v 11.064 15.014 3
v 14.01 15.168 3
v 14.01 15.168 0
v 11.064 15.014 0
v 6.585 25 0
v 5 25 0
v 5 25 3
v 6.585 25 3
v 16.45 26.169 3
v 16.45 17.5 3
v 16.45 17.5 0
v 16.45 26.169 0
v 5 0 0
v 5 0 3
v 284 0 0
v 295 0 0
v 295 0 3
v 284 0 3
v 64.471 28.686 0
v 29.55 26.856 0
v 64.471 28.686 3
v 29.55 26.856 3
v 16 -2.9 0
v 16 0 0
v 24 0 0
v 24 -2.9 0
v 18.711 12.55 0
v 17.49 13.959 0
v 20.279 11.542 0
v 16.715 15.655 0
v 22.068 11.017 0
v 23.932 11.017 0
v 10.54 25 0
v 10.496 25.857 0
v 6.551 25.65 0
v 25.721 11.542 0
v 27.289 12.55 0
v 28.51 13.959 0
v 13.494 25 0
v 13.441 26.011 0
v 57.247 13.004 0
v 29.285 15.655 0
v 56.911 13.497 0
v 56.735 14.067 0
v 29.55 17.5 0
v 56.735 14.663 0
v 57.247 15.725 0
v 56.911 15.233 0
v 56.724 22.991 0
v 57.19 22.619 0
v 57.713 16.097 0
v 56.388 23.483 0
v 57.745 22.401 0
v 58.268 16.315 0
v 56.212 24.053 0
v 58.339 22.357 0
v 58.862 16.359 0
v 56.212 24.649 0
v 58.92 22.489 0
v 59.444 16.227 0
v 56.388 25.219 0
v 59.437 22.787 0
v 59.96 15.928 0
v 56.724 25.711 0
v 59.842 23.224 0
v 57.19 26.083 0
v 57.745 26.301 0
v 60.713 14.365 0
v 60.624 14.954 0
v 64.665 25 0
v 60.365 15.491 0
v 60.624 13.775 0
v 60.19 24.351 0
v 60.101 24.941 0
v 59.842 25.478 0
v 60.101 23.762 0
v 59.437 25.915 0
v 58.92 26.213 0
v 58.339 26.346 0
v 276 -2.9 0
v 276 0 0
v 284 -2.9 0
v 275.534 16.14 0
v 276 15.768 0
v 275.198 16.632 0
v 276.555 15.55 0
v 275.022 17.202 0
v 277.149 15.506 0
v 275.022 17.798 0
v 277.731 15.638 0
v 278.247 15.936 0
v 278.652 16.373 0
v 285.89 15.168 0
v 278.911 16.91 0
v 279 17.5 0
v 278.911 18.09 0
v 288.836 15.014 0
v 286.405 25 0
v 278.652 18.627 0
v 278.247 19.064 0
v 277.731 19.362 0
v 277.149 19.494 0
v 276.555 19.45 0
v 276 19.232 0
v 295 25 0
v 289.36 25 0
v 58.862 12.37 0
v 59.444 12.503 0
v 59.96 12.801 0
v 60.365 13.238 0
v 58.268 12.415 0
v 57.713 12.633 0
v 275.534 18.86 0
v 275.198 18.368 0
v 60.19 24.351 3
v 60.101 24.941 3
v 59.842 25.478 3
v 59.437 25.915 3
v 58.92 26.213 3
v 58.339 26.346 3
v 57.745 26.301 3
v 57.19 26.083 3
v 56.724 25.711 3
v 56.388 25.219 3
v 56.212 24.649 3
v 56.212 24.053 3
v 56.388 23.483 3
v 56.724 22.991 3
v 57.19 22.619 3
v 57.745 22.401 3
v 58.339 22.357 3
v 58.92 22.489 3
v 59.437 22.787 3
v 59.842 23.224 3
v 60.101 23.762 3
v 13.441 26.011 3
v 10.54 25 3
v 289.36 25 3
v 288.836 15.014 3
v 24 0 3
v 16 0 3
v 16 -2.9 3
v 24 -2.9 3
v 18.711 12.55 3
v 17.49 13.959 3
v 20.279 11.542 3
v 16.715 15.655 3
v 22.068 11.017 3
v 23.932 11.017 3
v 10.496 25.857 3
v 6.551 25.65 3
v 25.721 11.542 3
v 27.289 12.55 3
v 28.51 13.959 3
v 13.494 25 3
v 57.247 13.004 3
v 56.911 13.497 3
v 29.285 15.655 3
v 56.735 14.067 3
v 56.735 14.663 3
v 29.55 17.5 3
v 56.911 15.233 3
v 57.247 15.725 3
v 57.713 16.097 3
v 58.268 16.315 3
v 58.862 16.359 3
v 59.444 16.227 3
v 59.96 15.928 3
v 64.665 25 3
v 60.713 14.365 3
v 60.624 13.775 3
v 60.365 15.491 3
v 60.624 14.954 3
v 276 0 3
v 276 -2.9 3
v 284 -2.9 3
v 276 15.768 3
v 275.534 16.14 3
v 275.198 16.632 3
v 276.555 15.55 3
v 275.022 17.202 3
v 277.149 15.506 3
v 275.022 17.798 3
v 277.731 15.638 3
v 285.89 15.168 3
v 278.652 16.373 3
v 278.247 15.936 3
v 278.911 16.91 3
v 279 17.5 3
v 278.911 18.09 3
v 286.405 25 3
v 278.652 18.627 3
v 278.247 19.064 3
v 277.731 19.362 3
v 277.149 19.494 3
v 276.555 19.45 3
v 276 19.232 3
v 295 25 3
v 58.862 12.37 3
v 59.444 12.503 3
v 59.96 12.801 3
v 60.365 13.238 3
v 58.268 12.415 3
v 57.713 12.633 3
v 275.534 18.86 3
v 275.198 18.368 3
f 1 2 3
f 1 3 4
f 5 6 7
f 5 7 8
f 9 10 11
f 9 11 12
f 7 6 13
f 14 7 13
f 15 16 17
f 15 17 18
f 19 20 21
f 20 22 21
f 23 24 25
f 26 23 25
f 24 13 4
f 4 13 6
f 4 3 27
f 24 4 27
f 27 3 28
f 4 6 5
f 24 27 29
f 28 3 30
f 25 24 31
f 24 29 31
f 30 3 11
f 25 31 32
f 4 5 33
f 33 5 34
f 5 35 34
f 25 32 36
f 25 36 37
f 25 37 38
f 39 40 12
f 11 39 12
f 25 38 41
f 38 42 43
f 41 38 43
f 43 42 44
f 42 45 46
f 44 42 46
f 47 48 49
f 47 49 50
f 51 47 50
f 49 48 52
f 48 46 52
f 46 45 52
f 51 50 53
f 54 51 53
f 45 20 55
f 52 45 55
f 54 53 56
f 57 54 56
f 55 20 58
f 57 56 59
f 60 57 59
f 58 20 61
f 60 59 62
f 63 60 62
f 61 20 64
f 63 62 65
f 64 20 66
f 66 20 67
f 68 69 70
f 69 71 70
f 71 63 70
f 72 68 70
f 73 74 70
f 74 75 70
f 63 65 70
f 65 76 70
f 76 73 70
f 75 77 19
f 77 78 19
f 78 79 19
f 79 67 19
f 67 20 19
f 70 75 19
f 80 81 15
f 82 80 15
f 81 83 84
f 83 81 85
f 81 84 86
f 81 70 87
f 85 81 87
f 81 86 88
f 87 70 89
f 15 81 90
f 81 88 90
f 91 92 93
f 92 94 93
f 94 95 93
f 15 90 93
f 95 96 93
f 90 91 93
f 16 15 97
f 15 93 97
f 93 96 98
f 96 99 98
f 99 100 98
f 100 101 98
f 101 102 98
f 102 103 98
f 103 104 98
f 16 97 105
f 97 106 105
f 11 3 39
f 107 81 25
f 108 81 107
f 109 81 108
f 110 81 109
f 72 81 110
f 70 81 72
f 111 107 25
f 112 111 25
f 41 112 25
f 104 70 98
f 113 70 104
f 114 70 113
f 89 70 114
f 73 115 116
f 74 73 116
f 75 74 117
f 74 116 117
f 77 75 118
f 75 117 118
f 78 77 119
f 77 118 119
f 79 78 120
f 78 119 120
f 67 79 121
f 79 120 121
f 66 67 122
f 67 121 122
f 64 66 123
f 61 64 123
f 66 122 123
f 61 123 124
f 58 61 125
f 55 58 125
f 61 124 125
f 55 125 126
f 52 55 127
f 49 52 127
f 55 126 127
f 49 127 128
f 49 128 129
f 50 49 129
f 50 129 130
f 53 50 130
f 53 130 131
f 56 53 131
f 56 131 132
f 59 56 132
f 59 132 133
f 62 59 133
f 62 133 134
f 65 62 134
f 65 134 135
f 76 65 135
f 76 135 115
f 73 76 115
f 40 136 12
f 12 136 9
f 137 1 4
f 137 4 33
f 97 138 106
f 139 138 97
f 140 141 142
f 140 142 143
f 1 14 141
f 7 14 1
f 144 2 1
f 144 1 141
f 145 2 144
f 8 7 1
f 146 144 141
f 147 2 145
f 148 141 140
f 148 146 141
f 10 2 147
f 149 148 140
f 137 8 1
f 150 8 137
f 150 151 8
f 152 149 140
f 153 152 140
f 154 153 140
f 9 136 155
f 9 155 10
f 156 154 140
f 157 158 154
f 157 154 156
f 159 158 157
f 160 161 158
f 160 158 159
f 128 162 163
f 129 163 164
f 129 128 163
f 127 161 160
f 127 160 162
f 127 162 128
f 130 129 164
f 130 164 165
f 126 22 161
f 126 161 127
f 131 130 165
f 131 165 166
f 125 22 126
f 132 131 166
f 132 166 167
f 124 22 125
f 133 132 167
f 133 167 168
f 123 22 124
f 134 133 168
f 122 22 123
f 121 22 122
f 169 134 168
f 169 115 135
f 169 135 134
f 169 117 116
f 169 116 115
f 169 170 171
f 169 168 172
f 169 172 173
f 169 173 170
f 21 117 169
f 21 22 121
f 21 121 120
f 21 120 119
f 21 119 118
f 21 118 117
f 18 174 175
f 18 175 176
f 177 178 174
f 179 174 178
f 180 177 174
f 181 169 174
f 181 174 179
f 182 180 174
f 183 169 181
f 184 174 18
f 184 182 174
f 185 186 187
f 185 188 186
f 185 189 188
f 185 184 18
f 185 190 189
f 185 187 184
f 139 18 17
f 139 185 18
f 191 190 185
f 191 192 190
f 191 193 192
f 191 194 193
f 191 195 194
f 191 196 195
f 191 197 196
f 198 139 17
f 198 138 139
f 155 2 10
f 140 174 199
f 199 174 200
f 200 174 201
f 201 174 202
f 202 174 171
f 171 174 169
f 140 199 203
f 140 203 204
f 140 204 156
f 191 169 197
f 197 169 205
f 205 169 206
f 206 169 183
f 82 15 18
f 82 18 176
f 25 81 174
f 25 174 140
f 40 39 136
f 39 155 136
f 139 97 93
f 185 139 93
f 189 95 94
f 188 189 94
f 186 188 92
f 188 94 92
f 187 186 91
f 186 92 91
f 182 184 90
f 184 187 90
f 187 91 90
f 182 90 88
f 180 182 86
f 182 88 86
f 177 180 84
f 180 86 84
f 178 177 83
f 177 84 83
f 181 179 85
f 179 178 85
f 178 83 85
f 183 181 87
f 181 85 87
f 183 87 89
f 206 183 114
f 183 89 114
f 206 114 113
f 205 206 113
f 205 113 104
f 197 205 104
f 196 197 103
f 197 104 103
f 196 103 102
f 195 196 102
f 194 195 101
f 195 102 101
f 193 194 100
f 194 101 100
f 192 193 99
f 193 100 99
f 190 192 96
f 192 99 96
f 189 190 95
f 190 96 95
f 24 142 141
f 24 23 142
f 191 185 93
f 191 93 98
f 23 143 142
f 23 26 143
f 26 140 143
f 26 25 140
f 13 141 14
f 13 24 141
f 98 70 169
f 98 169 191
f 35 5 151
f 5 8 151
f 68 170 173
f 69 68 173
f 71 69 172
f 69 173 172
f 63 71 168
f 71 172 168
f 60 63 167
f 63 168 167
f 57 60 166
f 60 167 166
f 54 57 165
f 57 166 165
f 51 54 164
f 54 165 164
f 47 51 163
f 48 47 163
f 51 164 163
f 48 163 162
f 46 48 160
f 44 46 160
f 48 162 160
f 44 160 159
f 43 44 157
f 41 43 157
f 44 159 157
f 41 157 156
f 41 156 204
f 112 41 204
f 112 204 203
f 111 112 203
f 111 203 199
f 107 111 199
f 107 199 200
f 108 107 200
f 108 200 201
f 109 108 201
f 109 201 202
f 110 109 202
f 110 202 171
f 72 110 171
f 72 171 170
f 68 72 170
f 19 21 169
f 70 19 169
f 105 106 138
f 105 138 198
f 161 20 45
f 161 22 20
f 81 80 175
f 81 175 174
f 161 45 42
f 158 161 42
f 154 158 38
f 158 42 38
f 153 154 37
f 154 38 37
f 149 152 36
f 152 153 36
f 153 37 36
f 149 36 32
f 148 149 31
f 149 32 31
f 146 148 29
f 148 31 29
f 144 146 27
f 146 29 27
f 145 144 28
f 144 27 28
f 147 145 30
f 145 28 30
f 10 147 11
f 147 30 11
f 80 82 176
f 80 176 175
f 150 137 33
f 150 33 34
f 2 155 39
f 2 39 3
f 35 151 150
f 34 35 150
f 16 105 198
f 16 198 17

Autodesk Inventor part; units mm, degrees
ref_plane "YZ Plane" through (0, 0, 0) normal (1, 0, 0) x (0, 1, 0)
ref_plane "XZ Plane" through (0, 0, 0) normal (0, 1, 0) x (-1, 0, 0)
sketch "草圖1" plane through (0, 0, 0) normal (0, 0, 1) x (1, 0, 0)
  line L0 (0, 25) -> (300, 25)
  line L1 (300, 25) -> (300, 0)
  line L2 (300, 0) -> (0, 0)
  line L3 (0, 0) -> (0, 25)
  circle A0 centre (23, 17.5) radius 6.55
  circle A1 centre (277, 17.5) radius 2
  line L4 (16, 0) -> (24, 0)
  line L5 (24, 0) -> (24, -2.9)
  line L6 (24, -2.9) -> (16, -2.9)
  line L7 (16, -2.9) -> (16, 0)
  line L8 (276, 0) -> (284, 0)
  line L9 (284, 0) -> (284, -2.9)
  line L10 (284, -2.9) -> (276, -2.9)
  line L11 (276, -2.9) -> (276, 0)
  line L12 (0, 25) -> (5, 25)
  line L13 (5, 25) -> (5, 0)
  line L14 (5, 0) -> (0, 0)
  line L15 (0, 0) -> (0, 25)
  line L16 (300, 25) -> (295, 25)
  line L17 (295, 25) -> (295, 0)
  line L18 (295, 0) -> (300, 0)
  line L19 (300, 0) -> (300, 25)
  line L20 (24, -1.45) -> (276, -1.45) construction
  point P0 (16, -1.45)
  point P1 (284, -1.45)
  point P2 (284, 0)
  point P3 (24, 0)
  point P4 (150, -1.45)
  point P5 (150, 0)
  dimension "d0" = 300
  dimension "d1" = 25
  dimension "d2" = 7.5
  dimension "d3" = 13.1
  dimension "d4" = 23
  dimension "d5" = 23
  dimension "d6" = 7.5
  dimension "d7" = 4
  dimension "d12" = 8
  dimension "d13" = 2.9
  dimension "d14" = 8
  dimension "d30" = 5
  dimension "d31" = 5
  dimension "d32" = 252
extrude "擠出1" add sketch "草圖1" along normal blind 3 contours L0 L17 L2 L13 | L2 L5 L6 L7 | L9 L10 L11 L2
sketch "草圖2" plane through (0, 0, 3) normal (0, 0, 1) x (1, 0, 0)
  line L0 (10.5404, 25) -> (13.4864, 25.1544)
  line L1 (13.4864, 25.1544) -> (14.0097, 15.1681)
  line L2 (14.0097, 15.1681) -> (11.0638, 15.0137)
  line L3 (11.0638, 15.0137) -> (10.5404, 25)
  line L4 (295, 25) -> (5, 25) projected
  line L5 (16.048, 25) -> (29.13, 25.6856)
  line L6 (29.13, 25.6856) -> (30.1465, 6.2887)
  line L7 (30.1465, 6.2887) -> (17.0645, 5.6031)
  line L8 (17.0645, 5.6031) -> (16.048, 25)
  circle A0 centre (23, 17.5) radius 6.55 projected
  line L9 (14.0097, 15.1681) -> (16.5562, 15.3016)
  line L10 (286.4135, 25.1544) -> (289.3595, 25)
  line L11 (289.3595, 25) -> (288.8361, 15.0137)
  line L12 (288.8361, 15.0137) -> (285.8901, 15.1681)
  line L13 (285.8901, 15.1681) -> (286.4135, 25.1544)
  line L14 (275.2453, 22.2337) -> (279.2399, 22.0243)
  line L15 (279.2399, 22.0243) -> (278.6818, 11.3762)
  line L16 (278.6818, 11.3762) -> (274.6873, 11.5855)
  line L17 (274.6873, 11.5855) -> (275.2453, 22.2337)
  circle A1 centre (277, 17.5) radius 2 projected
  line L18 (285.8901, 15.1681) -> (278.8997, 15.5344)
  point P0 (0, 0)
  point P1 (300, 25)
  point P2 (0, 25)
  point P3 (286.4054, 25)
  point P4 (13.4945, 25)
  dimension "d16" = 2.95
  dimension "d18" = 10
  dimension "d19" = 87
  dimension "d20" = 87
  dimension "d22" = 87
  dimension "d23" = 87
  dimension "d24" = 2.95
  dimension "d25" = 10
  dimension "d33" = 9.1
  dimension "d34" = 9
extrude "擠出2" cut sketch "草圖2" against normal up to surface (3 mm away) contours L4 L11 L12 L13 | L4 L1 L2 L3
sketch "草圖7" plane through (0, 0, 3) normal (0, 0, 1) x (1, 0, 0)
  line L0 (64.4714, 28.6858) -> (65.4135, 10.7104)
  line L1 (65.4135, 10.7104) -> (7.493, 7.675)
  line L2 (7.493, 7.675) -> (6.5509, 25.6503)
  line L3 (6.5509, 25.6503) -> (64.4714, 28.6858)
  line L4 (13.4945, 25) -> (14.0097, 15.1681) projected
  circle A0 centre (23, 17.5) radius 6.55 projected
  line L5 (285.8901, 15.1681) -> (286.4054, 25) projected
  line L6 (286.4054, 25) -> (13.4945, 25) projected
  line L7 (13.4945, 25) -> (14.0097, 15.1681) projected
  line L8 (14.0097, 15.1681) -> (11.0638, 15.0137) projected
  line L9 (11.0638, 15.0137) -> (10.5404, 25) projected
  line L10 (10.5404, 25) -> (5, 25) projected
  line L11 (5, 25) -> (5, 0) projected
  line L12 (5, 0) -> (16, 0) projected
  line L13 (16, 0) -> (16, -2.9) projected
  line L14 (16, -2.9) -> (24, -2.9) projected
  line L15 (24, -2.9) -> (24, 0) projected
  line L16 (24, 0) -> (276, 0) projected
  line L17 (276, 0) -> (276, -2.9) projected
  line L18 (276, -2.9) -> (284, -2.9) projected
  line L19 (284, -2.9) -> (284, 0) projected
  line L20 (284, 0) -> (295, 0) projected
  line L21 (295, 0) -> (295, 25) projected
  line L22 (295, 25) -> (289.3595, 25) projected
  line L23 (289.3595, 25) -> (288.8361, 15.0137) projected
  line L24 (288.8361, 15.0137) -> (285.8901, 15.1681) projected
  circle A1 centre (23, 17.5) radius 6.55 projected
  circle A2 centre (277, 17.5) radius 2 projected
  line L25 (13.4945, 25) -> (13.4414, 26.0114)
  line L26 (10.5404, 25) -> (11.0638, 15.0137) projected
  line L27 (10.5404, 25) -> (10.4955, 25.857)
  point P0 (0, 0)
  point P1 (64.6646, 25)
  point P2 (6.585, 25)
  dimension "d50" = 42
  dimension "d51" = 16
  dimension "d52" = 18
  dimension "d53" = 9
extrude "擠出5" add sketch "草圖7" against normal up to surface (3 mm away) contours L0 L6 L25 L3 | L27 L10 L2 L3
sketch "草圖9" plane through (0, 0, 3) normal (0, 0, 1) x (1, 0, 0)
  line L0 (10.4955, 25.857) -> (6.5509, 25.6503) projected
  line L1 (6.5509, 25.6503) -> (64.4714, 28.6858)
  line L2 (64.4714, 28.6858) -> (65.4135, 10.7104)
  line L3 (65.4135, 10.7104) -> (7.493, 7.675)
  line L4 (7.493, 7.675) -> (6.5509, 25.6503)
  circle A0 centre (58.1897, 24.3511) radius 2
  circle A1 centre (58.713, 14.3648) radius 2
  line L5 (58.1897, 24.3511) -> (58.713, 14.3648)
  line L6 (58.4513, 19.3579) -> (64.9424, 19.6981)
  circle A2 centre (23, 17.5) radius 6.55 projected
  point P0 (0, 0)
  dimension "d60" = 18
  dimension "d64" = 4
  dimension "d66" = 6.5
  dimension "d67" = 10
extrude "擠出6" cut sketch "草圖9" against normal up to surface (3 mm away) contours A1 | A0
sketch "草圖11" plane through (0, 0, 3) normal (0, 0, 1) x (1, 0, 0)
  line L0 (16.45, 26.8556) -> (29.55, 26.8556)
  line L1 (29.55, 26.8556) -> (29.55, 17.5)
  line L2 (29.55, 17.5) -> (16.45, 17.5)
  line L3 (16.45, 17.5) -> (16.45, 26.8556)
  circle A0 centre (23, 17.5) radius 6.55 projected
  line L4 (64.4714, 28.6858) -> (13.4414, 26.0114) projected
  point P0 (0, 0)
  dimension "d74" = 13.1
extrude "擠出7" cut sketch "草圖11" against normal blind 10 contours L0 L4 L3 | L1 A0 L3 L4 | L2 A0 picked at (21.0033, 19.0372)
ref_plane "工作平面2" through (150, 0, 0) normal (-1, 0, 0) x (0, 0, 1)
mirror "鏡射2" [suppressed]
sketch "草圖12" plane through (0, 0, 3) normal (0, 0, 1) x (1, 0, 0)
  arc A0 (279, 17.5) -> (279, 17.5) centre (277, 17.5) ccw projected
  line L0 (279, 17.5) -> (283.55, 17.5)
  circle A1 centre (277, 17.5) radius 6.55
  point P0 (0, 0)
extrude "擠出8" [suppressed]
sketch "草圖10" plane through (0, 0, 3) normal (0, 0, 1) x (1, 0, 0)
  line L0 (285.8901, 15.1681) -> (286.4054, 25) projected
  line L1 (286.4054, 25) -> (64.6646, 25) projected
  line L2 (14.0097, 15.1681) -> (11.0638, 15.0137) projected
  line L3 (6.585, 25) -> (5, 25) projected
  line L4 (5, 25) -> (5, 0) projected
  line L5 (5, 0) -> (16, 0) projected
  line L6 (16, 0) -> (16, -2.9) projected
  line L7 (16, -2.9) -> (24, -2.9) projected
  line L8 (24, -2.9) -> (24, 0) projected
  line L9 (24, 0) -> (276, 0) projected
  line L10 (276, 0) -> (276, -2.9) projected
  line L11 (276, -2.9) -> (284, -2.9) projected
  line L12 (284, -2.9) -> (284, 0) projected
  line L13 (284, 0) -> (295, 0) projected
  line L14 (295, 0) -> (295, 25) projected
  line L15 (295, 25) -> (289.3595, 25) projected
  line L16 (289.3595, 25) -> (288.8361, 15.0137) projected
  line L17 (288.8361, 15.0137) -> (285.8901, 15.1681) projected
  arc A0 (16.45, 17.5) -> (29.55, 17.5) centre (23, 17.5) ccw projected
  circle A1 centre (277, 17.5) radius 2 projected
  line L18 (13.4414, 26.0114) -> (14.0097, 15.1681) projected
  line L19 (11.0638, 15.0137) -> (10.4955, 25.857) projected
  line L20 (64.6646, 25) -> (64.4714, 28.6858) projected
  line L21 (64.4714, 28.6858) -> (29.55, 26.8556) projected
  line L22 (10.4955, 25.857) -> (6.5509, 25.6503) projected
  line L23 (6.5509, 25.6503) -> (6.585, 25) projected
  line L24 (29.55, 26.8556) -> (29.55, 17.5) projected
  line L25 (16.45, 17.5) -> (16.45, 26.1691) projected
  line L26 (16.45, 26.1691) -> (13.4414, 26.0114) projected
  point P0 (0, 0)
equation "\"d20\" = d19"
equation "\"d22\" = d23"
